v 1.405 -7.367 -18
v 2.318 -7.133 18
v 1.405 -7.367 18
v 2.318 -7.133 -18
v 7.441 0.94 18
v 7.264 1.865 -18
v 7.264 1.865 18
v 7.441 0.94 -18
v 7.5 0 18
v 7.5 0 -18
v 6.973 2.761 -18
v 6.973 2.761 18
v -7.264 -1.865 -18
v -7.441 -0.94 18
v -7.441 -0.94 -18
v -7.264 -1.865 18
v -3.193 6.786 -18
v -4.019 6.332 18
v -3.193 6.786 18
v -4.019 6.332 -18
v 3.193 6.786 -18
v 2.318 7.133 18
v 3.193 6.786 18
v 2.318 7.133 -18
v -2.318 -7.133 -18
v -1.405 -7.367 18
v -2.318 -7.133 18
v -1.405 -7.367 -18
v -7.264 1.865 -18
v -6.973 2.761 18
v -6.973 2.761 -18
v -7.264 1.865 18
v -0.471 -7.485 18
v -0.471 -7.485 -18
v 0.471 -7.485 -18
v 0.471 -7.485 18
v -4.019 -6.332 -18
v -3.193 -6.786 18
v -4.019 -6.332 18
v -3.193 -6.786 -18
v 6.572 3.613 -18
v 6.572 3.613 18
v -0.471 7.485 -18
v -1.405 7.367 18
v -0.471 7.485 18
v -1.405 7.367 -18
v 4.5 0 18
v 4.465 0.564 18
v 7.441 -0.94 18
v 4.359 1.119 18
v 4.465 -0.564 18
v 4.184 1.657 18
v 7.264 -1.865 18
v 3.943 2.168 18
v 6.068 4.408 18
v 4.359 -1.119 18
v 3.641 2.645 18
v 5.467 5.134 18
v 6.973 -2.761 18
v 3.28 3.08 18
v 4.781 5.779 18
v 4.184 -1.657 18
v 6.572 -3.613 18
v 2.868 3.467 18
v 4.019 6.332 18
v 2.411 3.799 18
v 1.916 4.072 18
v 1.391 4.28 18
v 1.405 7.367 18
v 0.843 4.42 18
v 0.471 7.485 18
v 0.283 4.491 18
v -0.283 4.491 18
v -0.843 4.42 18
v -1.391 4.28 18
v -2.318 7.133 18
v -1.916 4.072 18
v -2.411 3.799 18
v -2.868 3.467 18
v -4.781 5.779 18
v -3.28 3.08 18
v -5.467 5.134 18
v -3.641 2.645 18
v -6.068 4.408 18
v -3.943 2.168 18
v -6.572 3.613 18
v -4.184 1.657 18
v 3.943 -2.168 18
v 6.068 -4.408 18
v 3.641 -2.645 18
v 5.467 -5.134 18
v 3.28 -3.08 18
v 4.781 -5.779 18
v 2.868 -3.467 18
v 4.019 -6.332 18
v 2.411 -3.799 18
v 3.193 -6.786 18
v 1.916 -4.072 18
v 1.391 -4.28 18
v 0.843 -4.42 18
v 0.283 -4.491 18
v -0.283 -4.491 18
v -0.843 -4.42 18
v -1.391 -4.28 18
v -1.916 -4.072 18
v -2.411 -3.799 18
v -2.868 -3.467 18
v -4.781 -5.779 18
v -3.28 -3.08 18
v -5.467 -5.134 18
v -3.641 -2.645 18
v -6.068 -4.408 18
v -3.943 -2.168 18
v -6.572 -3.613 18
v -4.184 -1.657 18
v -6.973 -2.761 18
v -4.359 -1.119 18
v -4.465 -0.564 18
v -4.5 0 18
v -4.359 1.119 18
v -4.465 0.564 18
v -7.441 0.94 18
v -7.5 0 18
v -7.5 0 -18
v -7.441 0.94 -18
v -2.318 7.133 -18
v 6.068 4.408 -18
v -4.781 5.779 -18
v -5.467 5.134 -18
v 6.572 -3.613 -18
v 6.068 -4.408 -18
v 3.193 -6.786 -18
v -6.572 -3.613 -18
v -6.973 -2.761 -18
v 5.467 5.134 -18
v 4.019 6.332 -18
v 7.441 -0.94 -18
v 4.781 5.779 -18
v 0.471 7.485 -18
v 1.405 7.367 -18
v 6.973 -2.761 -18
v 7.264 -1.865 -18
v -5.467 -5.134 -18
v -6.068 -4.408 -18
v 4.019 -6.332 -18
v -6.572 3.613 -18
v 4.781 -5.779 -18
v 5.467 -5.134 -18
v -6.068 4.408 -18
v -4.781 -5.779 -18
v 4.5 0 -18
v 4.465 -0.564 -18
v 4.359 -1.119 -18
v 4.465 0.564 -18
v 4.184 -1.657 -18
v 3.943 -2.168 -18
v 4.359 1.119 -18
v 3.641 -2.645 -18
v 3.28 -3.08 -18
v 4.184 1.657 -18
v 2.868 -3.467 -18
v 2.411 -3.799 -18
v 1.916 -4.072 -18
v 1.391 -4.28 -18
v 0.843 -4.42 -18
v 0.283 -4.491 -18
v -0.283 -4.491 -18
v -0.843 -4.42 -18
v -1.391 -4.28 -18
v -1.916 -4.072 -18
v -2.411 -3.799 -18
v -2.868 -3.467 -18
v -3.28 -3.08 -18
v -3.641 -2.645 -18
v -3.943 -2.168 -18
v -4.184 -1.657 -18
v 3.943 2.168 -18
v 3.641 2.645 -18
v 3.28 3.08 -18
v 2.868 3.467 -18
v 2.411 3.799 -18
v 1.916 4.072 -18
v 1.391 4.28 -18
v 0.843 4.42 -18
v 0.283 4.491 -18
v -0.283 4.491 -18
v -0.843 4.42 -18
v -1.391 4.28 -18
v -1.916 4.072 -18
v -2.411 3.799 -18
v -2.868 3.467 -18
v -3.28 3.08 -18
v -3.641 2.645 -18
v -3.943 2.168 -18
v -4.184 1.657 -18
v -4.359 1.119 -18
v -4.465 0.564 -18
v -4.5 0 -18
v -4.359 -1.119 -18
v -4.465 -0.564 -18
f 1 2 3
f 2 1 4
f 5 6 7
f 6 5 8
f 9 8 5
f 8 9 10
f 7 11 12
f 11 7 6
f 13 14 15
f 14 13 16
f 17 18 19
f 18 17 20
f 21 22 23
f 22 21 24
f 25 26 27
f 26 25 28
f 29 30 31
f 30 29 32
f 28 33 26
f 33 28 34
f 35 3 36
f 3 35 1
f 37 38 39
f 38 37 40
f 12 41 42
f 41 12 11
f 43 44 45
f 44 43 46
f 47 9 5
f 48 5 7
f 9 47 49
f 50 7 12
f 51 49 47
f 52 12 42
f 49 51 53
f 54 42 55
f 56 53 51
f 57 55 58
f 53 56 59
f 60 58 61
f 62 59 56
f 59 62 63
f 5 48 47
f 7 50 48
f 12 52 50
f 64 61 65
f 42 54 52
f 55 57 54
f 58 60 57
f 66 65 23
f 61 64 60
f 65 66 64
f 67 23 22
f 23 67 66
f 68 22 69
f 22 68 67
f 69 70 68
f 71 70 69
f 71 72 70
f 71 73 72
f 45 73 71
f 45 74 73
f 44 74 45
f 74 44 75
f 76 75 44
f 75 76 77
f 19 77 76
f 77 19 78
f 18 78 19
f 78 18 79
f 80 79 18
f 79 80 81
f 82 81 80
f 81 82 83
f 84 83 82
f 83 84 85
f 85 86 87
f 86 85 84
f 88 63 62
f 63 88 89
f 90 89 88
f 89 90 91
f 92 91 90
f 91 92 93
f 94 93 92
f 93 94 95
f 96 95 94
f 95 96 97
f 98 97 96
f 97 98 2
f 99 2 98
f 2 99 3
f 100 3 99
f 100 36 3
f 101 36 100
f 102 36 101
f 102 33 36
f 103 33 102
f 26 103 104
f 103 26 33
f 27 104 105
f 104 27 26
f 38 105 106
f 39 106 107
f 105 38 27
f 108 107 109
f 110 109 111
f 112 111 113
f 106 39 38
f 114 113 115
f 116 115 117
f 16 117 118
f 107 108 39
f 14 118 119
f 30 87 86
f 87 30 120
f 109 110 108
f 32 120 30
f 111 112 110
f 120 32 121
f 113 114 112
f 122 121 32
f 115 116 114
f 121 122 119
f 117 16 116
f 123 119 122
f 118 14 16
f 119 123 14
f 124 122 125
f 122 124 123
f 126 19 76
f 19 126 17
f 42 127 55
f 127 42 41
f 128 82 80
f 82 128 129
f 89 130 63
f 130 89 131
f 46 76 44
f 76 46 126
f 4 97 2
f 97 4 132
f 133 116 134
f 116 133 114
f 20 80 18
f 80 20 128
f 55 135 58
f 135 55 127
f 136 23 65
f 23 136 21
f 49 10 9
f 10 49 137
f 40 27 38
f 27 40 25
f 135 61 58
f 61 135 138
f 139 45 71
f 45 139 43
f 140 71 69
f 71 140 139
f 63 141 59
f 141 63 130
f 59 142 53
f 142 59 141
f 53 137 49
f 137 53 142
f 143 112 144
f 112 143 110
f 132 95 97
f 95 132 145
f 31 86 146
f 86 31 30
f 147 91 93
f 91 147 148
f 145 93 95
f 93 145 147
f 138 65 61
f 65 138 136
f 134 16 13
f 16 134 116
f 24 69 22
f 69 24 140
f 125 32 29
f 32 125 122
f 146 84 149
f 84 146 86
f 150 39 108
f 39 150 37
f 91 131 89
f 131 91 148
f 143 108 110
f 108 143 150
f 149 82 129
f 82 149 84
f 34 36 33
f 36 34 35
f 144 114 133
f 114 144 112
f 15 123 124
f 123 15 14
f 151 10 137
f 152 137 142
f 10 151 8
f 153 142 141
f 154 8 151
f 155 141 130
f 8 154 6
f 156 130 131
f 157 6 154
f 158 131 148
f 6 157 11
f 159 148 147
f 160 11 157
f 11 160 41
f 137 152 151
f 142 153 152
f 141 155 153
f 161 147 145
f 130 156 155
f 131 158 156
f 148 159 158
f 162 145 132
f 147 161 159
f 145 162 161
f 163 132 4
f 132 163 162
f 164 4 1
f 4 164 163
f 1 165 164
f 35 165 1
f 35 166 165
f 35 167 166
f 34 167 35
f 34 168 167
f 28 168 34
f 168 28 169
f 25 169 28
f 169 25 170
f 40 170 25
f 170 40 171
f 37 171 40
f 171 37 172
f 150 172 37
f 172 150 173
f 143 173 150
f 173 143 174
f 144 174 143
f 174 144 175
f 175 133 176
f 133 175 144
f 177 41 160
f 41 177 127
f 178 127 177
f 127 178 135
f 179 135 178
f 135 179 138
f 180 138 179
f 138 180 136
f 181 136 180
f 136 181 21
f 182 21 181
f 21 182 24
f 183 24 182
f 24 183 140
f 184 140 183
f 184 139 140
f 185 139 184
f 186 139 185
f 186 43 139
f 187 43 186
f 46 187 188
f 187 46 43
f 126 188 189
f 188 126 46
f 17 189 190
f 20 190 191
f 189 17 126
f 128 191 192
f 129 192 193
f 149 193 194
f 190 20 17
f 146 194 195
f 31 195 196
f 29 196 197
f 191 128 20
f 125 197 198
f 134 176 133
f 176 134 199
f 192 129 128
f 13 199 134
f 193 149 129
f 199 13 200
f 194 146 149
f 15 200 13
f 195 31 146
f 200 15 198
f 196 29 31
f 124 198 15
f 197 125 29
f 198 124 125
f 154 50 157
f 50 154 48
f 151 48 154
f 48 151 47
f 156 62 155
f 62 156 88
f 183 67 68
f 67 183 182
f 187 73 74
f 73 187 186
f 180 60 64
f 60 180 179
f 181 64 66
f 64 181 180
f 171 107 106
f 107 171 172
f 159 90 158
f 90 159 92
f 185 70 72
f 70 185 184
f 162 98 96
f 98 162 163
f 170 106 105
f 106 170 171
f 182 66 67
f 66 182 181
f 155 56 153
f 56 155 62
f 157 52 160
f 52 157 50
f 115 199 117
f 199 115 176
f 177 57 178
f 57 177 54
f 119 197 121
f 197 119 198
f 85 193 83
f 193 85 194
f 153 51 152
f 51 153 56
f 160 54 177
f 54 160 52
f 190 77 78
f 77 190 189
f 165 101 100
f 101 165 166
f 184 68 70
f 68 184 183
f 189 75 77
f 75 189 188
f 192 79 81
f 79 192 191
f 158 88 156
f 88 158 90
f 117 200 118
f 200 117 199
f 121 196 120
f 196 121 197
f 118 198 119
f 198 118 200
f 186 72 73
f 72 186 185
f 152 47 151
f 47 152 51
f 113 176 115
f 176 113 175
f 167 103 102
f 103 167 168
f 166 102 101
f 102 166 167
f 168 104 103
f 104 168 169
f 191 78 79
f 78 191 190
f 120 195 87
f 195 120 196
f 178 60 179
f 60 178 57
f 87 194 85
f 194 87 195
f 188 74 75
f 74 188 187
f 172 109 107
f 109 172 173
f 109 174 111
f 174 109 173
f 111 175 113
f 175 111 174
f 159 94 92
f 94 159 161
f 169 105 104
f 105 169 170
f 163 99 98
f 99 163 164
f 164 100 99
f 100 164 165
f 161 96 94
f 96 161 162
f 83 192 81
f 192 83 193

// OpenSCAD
$fn = 50;


difference() {
	union() {
		translate(v = [0, 0, -18.0000000000]) {
			cylinder(h = 36, r = 7.5000000000);
		}
	}
	union() {
		translate(v = [0, 0, -100.0000000000]) {
			cylinder(h = 200, r = 4.5000000000);
		}
	}
}
